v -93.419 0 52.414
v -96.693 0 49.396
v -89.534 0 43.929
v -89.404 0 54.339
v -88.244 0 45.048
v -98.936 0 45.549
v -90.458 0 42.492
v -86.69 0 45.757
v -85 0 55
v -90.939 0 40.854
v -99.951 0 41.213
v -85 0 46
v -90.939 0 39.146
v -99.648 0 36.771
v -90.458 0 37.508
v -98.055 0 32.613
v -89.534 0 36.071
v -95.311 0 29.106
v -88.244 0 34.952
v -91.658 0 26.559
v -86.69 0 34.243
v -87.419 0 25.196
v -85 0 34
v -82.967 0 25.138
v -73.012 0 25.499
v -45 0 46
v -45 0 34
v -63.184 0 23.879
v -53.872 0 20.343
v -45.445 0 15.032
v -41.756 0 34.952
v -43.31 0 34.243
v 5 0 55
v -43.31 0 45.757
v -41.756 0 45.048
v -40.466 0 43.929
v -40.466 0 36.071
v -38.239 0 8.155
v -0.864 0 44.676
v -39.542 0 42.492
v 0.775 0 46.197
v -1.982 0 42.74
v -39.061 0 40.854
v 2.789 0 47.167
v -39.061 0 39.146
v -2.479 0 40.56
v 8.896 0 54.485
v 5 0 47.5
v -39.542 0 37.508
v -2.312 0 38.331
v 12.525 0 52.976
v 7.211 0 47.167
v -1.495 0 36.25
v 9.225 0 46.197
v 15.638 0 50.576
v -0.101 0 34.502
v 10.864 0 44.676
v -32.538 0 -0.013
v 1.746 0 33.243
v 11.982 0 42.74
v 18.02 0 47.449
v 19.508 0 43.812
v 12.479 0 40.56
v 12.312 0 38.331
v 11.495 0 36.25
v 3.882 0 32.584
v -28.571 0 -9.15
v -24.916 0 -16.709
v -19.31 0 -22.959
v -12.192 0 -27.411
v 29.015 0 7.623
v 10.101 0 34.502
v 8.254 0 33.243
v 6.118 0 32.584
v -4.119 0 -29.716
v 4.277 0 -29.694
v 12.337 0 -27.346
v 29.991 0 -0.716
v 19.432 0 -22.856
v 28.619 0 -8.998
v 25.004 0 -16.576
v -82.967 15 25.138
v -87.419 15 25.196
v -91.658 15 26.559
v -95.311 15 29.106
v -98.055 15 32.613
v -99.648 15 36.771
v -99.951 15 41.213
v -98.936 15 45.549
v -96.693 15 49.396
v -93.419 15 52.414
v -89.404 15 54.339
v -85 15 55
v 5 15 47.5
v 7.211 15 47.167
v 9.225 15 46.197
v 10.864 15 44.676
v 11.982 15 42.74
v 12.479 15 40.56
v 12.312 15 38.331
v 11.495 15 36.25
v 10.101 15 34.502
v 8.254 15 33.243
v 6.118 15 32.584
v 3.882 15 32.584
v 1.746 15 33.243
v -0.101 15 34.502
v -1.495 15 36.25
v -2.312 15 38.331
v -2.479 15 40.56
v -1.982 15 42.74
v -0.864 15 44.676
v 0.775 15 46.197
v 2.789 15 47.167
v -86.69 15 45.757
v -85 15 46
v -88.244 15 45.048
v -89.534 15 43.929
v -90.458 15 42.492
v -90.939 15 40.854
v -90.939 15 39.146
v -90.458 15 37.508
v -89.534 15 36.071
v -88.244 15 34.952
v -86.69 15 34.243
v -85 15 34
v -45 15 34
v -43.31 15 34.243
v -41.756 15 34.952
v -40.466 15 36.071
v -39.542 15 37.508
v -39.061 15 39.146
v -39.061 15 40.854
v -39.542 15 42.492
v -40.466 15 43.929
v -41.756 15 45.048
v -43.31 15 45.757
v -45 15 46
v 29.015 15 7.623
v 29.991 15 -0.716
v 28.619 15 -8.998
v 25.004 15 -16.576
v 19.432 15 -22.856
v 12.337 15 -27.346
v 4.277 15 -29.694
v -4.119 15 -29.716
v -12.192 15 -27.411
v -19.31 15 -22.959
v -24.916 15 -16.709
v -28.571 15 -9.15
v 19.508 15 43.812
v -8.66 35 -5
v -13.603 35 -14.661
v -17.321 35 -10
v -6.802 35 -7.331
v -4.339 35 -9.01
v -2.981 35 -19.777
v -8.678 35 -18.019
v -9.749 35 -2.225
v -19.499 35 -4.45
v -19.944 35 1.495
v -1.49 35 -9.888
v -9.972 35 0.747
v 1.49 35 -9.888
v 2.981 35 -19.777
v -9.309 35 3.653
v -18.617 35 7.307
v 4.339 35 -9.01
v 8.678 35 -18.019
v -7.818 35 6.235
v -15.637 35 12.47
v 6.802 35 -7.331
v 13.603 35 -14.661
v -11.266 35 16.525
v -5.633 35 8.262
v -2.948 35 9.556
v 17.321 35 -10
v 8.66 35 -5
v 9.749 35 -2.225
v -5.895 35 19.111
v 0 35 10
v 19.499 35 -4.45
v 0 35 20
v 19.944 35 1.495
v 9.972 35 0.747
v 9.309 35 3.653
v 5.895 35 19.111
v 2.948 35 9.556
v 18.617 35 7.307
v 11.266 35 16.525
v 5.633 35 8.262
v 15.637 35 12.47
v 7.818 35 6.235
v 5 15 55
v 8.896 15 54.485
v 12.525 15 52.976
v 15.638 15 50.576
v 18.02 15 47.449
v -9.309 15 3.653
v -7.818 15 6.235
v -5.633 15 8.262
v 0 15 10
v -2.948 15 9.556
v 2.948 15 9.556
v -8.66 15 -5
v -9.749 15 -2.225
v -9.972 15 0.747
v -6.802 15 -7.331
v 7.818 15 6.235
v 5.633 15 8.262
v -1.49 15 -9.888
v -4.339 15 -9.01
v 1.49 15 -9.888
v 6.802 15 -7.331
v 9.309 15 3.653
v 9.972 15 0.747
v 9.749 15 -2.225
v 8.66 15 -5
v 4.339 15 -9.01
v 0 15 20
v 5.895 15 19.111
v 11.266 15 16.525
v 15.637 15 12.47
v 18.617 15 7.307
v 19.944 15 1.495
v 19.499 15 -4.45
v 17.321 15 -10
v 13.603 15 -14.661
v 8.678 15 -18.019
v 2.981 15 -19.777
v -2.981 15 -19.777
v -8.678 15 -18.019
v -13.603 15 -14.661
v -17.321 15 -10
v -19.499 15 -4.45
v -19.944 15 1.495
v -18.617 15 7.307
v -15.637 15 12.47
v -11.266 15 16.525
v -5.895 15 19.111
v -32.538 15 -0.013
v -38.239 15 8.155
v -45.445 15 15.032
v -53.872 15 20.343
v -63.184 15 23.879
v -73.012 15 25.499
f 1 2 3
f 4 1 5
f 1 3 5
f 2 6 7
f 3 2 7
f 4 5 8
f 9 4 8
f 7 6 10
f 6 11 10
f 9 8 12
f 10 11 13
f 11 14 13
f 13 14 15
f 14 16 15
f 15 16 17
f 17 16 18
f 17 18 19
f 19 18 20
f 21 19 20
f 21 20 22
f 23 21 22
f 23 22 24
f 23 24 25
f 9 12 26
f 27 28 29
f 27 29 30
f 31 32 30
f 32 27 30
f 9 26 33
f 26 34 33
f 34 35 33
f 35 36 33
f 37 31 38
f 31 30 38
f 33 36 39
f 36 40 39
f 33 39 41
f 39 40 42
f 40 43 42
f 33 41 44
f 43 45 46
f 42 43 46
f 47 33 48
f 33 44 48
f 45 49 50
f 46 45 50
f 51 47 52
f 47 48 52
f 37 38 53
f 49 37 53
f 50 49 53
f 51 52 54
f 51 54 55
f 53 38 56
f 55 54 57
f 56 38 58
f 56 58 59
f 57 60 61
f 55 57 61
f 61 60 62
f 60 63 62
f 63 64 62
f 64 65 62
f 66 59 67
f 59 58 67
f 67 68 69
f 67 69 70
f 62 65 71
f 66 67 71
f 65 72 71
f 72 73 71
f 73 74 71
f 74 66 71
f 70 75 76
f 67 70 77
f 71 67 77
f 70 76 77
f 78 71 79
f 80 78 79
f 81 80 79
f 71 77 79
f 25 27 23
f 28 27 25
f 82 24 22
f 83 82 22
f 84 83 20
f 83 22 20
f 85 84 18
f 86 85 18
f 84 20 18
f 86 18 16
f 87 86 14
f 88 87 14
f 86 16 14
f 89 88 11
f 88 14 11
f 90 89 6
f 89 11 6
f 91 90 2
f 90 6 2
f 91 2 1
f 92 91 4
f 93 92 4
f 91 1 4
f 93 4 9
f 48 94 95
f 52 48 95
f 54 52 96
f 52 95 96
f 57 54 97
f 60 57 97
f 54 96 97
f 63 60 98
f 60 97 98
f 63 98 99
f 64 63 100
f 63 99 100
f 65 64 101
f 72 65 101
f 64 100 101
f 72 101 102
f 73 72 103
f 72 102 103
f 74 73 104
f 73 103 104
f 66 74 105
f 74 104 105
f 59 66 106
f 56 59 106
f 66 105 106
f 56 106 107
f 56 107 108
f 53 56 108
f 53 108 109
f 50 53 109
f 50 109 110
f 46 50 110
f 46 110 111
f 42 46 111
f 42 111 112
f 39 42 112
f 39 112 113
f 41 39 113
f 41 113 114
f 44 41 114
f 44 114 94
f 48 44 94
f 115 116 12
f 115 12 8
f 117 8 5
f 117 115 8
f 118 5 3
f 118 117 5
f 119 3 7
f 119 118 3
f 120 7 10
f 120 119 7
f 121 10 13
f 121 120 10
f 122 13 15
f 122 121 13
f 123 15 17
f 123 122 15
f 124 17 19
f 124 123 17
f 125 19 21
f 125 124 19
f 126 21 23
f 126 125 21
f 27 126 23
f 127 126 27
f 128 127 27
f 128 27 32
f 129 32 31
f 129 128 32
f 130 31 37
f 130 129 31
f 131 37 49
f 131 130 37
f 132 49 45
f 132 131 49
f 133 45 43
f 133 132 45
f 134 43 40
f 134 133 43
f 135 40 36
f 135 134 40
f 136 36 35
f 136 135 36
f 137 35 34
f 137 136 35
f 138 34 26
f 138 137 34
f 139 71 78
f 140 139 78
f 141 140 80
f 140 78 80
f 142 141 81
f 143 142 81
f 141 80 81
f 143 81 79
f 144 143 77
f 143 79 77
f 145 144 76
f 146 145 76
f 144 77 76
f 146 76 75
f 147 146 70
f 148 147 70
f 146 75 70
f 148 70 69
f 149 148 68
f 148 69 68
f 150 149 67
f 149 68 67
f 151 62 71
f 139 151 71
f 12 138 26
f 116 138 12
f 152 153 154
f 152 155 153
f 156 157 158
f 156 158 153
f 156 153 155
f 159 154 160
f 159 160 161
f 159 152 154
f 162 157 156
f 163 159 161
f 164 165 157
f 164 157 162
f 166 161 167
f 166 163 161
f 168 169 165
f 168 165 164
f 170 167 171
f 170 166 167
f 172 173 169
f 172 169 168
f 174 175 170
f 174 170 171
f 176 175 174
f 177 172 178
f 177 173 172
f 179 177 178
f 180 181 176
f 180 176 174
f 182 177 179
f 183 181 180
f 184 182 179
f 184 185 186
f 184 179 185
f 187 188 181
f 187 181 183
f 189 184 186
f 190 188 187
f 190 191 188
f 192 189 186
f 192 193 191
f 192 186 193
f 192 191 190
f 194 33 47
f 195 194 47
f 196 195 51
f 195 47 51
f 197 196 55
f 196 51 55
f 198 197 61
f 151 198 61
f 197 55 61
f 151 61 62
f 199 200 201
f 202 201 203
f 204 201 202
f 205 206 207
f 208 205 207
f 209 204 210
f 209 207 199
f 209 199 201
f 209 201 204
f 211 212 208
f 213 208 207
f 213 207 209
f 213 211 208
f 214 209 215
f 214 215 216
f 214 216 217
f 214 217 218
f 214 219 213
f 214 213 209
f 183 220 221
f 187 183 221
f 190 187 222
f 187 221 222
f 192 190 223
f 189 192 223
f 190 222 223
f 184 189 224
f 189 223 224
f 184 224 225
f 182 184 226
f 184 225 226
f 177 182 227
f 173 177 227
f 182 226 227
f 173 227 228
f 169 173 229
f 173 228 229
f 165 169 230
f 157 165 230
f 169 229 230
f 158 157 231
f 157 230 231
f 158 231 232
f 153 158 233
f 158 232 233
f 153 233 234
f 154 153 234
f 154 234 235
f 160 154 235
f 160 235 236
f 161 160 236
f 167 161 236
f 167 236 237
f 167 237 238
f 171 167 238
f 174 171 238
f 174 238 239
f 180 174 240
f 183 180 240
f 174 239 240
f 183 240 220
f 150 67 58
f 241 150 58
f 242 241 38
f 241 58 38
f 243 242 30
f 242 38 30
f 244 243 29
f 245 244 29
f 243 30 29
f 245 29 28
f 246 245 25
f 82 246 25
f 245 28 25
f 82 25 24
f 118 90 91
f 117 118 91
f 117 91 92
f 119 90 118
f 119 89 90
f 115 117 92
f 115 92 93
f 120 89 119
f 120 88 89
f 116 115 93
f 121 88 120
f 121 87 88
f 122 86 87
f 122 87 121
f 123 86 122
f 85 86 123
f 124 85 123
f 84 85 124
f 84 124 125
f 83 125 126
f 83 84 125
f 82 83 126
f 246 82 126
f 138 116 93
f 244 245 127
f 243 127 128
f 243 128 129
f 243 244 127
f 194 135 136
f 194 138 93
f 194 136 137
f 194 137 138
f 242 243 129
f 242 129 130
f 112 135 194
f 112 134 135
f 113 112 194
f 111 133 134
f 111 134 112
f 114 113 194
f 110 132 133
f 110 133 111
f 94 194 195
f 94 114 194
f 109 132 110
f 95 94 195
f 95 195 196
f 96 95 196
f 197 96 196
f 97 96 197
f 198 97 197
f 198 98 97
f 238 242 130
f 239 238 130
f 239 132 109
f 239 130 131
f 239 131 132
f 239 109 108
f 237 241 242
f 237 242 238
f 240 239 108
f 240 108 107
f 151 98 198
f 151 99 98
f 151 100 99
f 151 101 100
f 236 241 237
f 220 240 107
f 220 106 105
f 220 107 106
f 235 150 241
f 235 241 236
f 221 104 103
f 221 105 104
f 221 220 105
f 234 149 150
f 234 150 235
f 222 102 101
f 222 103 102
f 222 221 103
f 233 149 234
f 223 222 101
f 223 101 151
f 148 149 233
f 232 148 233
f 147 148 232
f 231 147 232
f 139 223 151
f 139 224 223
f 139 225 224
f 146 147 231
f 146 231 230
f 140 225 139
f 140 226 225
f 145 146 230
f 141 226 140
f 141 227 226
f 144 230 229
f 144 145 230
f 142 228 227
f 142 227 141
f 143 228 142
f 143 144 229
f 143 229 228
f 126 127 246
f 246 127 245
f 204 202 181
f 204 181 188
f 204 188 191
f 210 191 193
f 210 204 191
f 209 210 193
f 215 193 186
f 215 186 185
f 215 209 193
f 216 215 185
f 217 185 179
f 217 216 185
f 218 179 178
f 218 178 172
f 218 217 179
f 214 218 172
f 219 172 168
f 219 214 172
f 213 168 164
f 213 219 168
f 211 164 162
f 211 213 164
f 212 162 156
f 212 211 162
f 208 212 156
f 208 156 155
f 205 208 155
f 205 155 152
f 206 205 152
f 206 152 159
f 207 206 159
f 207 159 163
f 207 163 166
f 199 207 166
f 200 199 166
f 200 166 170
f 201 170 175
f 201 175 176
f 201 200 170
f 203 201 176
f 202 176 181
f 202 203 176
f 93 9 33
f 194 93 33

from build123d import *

# Parameters (mm, degrees)
BOSS_EXTRUDE1_DEPTH = 15
SKETCH2_R           = 20
SKETCH2_R_2         = 10
BOSS_EXTRUDE2_DEPTH = 20
SKETCH5_R           = 7.5
CUT_EXTRUDE1_DEPTH  = 116.866302263
CUT_EXTRUDE2_DEPTH  = 116.866302263


with BuildPart() as part:
    # Sketch1 → Boss-Extrude1 (new body)
    with BuildSketch(Plane(origin=(0, 0, 0), x_dir=(1, 0, 0), z_dir=(0, 1, 0))):
        with BuildLine():
            Line((-85, -55), (5, -55))
            ThreePointArc((5, -55), (14.16042736, -51.877986807), (19.507658043, -43.811542745))
            Line((19.507658043, -43.811542745), (29.015316087, -7.623085489))
            ThreePointArc((29.015316087, -7.623085489), (8.389479092, 28.803066513), (-28.570577696, 9.149977603))
            ThreePointArc((-28.570577696, 9.149977603), (-49.525739839, -17.897965522), (-82.966509351, -25.138475321))
            ThreePointArc((-82.966509351, -25.138475321), (-99.965341128, -38.980899952), (-85, -55))
        make_face()
    extrude(amount=BOSS_EXTRUDE1_DEPTH)

    # Sketch2 → Boss-Extrude2 (add)
    with BuildSketch(Plane(origin=(0, 15, 0), x_dir=(1, 0, 0), z_dir=(0, 1, 0))):
        Circle(SKETCH2_R)
        Circle(SKETCH2_R_2, mode=Mode.SUBTRACT)
    extrude(amount=BOSS_EXTRUDE2_DEPTH)

    # Sketch5 → Cut-Extrude1 (cut, through all)
    with BuildSketch(Plane(origin=(0, 15, 0), x_dir=(1, 0, 0), z_dir=(0, 1, 0))):
        with Locations((5, -40)):
            Circle(SKETCH5_R)
    extrude(amount=-CUT_EXTRUDE1_DEPTH, mode=Mode.SUBTRACT)

    # Sketch6 → Cut-Extrude2 (cut, through all)
    with BuildSketch(Plane(origin=(0, 15, 0), x_dir=(1, 0, 0), z_dir=(0, 1, 0))):
        with BuildLine():
            Line((-85, -34), (-45, -34))
            ThreePointArc((-45, -34), (-39, -40), (-45, -46))
            Line((-45, -46), (-85, -46))
            ThreePointArc((-85, -46), (-91, -40), (-85, -34))
        make_face()
    extrude(amount=-CUT_EXTRUDE2_DEPTH, mode=Mode.SUBTRACT)


solid = part.part
